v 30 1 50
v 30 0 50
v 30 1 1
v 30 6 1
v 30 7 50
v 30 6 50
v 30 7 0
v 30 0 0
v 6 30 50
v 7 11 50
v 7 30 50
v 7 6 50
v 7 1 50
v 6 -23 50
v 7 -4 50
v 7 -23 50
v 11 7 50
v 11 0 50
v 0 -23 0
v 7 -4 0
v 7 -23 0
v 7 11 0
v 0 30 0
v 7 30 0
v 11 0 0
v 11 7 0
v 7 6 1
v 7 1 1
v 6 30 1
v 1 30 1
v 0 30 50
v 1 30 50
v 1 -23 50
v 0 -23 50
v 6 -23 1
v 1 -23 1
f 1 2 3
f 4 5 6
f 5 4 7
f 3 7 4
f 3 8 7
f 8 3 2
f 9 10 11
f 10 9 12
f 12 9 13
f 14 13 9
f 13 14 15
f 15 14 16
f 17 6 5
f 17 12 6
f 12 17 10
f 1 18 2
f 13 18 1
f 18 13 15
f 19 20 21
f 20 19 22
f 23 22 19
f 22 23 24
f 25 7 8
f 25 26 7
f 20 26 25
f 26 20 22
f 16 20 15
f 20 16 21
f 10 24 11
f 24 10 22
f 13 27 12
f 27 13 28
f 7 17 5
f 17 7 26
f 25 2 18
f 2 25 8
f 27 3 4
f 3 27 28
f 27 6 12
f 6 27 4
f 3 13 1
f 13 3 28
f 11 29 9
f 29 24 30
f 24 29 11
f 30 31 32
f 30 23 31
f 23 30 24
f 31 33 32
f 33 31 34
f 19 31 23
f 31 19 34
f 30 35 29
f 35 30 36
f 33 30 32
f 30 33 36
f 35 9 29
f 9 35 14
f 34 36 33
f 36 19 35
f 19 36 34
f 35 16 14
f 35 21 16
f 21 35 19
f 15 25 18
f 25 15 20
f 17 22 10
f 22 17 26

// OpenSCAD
translate([5+2,0,0])
  difference() {
    cube([30-5-2,5+2,50]);
    translate([0,1,1]) cube([50,5,50]);
  }



translate([5+2,0,0])
rotate([0,0,90])
    difference() {
      cube([30,5+2,50]);
      translate([0,1,1]) cube([50,5,50]);
    }
//
color("red")   
translate([0,5+2,0])
rotate([0,0,-90])
    difference() {
      cube([30,5+2,50]);
      translate([0,1,1]) cube([50,5,50]);
    }



//cylinder(r=1,h=50, $fn=50);
//translate([7,7,0])
//cylinder(r=1,h=50, $fn=50);

translate([7,-4,0])
linear_extrude(height=50)
polygon(points=[[0,0],[0,4],[4,4]]);

translate([7,3,0])
linear_extrude(height=50)
polygon(points=[[0,8],[0,4],[4,4]]);
